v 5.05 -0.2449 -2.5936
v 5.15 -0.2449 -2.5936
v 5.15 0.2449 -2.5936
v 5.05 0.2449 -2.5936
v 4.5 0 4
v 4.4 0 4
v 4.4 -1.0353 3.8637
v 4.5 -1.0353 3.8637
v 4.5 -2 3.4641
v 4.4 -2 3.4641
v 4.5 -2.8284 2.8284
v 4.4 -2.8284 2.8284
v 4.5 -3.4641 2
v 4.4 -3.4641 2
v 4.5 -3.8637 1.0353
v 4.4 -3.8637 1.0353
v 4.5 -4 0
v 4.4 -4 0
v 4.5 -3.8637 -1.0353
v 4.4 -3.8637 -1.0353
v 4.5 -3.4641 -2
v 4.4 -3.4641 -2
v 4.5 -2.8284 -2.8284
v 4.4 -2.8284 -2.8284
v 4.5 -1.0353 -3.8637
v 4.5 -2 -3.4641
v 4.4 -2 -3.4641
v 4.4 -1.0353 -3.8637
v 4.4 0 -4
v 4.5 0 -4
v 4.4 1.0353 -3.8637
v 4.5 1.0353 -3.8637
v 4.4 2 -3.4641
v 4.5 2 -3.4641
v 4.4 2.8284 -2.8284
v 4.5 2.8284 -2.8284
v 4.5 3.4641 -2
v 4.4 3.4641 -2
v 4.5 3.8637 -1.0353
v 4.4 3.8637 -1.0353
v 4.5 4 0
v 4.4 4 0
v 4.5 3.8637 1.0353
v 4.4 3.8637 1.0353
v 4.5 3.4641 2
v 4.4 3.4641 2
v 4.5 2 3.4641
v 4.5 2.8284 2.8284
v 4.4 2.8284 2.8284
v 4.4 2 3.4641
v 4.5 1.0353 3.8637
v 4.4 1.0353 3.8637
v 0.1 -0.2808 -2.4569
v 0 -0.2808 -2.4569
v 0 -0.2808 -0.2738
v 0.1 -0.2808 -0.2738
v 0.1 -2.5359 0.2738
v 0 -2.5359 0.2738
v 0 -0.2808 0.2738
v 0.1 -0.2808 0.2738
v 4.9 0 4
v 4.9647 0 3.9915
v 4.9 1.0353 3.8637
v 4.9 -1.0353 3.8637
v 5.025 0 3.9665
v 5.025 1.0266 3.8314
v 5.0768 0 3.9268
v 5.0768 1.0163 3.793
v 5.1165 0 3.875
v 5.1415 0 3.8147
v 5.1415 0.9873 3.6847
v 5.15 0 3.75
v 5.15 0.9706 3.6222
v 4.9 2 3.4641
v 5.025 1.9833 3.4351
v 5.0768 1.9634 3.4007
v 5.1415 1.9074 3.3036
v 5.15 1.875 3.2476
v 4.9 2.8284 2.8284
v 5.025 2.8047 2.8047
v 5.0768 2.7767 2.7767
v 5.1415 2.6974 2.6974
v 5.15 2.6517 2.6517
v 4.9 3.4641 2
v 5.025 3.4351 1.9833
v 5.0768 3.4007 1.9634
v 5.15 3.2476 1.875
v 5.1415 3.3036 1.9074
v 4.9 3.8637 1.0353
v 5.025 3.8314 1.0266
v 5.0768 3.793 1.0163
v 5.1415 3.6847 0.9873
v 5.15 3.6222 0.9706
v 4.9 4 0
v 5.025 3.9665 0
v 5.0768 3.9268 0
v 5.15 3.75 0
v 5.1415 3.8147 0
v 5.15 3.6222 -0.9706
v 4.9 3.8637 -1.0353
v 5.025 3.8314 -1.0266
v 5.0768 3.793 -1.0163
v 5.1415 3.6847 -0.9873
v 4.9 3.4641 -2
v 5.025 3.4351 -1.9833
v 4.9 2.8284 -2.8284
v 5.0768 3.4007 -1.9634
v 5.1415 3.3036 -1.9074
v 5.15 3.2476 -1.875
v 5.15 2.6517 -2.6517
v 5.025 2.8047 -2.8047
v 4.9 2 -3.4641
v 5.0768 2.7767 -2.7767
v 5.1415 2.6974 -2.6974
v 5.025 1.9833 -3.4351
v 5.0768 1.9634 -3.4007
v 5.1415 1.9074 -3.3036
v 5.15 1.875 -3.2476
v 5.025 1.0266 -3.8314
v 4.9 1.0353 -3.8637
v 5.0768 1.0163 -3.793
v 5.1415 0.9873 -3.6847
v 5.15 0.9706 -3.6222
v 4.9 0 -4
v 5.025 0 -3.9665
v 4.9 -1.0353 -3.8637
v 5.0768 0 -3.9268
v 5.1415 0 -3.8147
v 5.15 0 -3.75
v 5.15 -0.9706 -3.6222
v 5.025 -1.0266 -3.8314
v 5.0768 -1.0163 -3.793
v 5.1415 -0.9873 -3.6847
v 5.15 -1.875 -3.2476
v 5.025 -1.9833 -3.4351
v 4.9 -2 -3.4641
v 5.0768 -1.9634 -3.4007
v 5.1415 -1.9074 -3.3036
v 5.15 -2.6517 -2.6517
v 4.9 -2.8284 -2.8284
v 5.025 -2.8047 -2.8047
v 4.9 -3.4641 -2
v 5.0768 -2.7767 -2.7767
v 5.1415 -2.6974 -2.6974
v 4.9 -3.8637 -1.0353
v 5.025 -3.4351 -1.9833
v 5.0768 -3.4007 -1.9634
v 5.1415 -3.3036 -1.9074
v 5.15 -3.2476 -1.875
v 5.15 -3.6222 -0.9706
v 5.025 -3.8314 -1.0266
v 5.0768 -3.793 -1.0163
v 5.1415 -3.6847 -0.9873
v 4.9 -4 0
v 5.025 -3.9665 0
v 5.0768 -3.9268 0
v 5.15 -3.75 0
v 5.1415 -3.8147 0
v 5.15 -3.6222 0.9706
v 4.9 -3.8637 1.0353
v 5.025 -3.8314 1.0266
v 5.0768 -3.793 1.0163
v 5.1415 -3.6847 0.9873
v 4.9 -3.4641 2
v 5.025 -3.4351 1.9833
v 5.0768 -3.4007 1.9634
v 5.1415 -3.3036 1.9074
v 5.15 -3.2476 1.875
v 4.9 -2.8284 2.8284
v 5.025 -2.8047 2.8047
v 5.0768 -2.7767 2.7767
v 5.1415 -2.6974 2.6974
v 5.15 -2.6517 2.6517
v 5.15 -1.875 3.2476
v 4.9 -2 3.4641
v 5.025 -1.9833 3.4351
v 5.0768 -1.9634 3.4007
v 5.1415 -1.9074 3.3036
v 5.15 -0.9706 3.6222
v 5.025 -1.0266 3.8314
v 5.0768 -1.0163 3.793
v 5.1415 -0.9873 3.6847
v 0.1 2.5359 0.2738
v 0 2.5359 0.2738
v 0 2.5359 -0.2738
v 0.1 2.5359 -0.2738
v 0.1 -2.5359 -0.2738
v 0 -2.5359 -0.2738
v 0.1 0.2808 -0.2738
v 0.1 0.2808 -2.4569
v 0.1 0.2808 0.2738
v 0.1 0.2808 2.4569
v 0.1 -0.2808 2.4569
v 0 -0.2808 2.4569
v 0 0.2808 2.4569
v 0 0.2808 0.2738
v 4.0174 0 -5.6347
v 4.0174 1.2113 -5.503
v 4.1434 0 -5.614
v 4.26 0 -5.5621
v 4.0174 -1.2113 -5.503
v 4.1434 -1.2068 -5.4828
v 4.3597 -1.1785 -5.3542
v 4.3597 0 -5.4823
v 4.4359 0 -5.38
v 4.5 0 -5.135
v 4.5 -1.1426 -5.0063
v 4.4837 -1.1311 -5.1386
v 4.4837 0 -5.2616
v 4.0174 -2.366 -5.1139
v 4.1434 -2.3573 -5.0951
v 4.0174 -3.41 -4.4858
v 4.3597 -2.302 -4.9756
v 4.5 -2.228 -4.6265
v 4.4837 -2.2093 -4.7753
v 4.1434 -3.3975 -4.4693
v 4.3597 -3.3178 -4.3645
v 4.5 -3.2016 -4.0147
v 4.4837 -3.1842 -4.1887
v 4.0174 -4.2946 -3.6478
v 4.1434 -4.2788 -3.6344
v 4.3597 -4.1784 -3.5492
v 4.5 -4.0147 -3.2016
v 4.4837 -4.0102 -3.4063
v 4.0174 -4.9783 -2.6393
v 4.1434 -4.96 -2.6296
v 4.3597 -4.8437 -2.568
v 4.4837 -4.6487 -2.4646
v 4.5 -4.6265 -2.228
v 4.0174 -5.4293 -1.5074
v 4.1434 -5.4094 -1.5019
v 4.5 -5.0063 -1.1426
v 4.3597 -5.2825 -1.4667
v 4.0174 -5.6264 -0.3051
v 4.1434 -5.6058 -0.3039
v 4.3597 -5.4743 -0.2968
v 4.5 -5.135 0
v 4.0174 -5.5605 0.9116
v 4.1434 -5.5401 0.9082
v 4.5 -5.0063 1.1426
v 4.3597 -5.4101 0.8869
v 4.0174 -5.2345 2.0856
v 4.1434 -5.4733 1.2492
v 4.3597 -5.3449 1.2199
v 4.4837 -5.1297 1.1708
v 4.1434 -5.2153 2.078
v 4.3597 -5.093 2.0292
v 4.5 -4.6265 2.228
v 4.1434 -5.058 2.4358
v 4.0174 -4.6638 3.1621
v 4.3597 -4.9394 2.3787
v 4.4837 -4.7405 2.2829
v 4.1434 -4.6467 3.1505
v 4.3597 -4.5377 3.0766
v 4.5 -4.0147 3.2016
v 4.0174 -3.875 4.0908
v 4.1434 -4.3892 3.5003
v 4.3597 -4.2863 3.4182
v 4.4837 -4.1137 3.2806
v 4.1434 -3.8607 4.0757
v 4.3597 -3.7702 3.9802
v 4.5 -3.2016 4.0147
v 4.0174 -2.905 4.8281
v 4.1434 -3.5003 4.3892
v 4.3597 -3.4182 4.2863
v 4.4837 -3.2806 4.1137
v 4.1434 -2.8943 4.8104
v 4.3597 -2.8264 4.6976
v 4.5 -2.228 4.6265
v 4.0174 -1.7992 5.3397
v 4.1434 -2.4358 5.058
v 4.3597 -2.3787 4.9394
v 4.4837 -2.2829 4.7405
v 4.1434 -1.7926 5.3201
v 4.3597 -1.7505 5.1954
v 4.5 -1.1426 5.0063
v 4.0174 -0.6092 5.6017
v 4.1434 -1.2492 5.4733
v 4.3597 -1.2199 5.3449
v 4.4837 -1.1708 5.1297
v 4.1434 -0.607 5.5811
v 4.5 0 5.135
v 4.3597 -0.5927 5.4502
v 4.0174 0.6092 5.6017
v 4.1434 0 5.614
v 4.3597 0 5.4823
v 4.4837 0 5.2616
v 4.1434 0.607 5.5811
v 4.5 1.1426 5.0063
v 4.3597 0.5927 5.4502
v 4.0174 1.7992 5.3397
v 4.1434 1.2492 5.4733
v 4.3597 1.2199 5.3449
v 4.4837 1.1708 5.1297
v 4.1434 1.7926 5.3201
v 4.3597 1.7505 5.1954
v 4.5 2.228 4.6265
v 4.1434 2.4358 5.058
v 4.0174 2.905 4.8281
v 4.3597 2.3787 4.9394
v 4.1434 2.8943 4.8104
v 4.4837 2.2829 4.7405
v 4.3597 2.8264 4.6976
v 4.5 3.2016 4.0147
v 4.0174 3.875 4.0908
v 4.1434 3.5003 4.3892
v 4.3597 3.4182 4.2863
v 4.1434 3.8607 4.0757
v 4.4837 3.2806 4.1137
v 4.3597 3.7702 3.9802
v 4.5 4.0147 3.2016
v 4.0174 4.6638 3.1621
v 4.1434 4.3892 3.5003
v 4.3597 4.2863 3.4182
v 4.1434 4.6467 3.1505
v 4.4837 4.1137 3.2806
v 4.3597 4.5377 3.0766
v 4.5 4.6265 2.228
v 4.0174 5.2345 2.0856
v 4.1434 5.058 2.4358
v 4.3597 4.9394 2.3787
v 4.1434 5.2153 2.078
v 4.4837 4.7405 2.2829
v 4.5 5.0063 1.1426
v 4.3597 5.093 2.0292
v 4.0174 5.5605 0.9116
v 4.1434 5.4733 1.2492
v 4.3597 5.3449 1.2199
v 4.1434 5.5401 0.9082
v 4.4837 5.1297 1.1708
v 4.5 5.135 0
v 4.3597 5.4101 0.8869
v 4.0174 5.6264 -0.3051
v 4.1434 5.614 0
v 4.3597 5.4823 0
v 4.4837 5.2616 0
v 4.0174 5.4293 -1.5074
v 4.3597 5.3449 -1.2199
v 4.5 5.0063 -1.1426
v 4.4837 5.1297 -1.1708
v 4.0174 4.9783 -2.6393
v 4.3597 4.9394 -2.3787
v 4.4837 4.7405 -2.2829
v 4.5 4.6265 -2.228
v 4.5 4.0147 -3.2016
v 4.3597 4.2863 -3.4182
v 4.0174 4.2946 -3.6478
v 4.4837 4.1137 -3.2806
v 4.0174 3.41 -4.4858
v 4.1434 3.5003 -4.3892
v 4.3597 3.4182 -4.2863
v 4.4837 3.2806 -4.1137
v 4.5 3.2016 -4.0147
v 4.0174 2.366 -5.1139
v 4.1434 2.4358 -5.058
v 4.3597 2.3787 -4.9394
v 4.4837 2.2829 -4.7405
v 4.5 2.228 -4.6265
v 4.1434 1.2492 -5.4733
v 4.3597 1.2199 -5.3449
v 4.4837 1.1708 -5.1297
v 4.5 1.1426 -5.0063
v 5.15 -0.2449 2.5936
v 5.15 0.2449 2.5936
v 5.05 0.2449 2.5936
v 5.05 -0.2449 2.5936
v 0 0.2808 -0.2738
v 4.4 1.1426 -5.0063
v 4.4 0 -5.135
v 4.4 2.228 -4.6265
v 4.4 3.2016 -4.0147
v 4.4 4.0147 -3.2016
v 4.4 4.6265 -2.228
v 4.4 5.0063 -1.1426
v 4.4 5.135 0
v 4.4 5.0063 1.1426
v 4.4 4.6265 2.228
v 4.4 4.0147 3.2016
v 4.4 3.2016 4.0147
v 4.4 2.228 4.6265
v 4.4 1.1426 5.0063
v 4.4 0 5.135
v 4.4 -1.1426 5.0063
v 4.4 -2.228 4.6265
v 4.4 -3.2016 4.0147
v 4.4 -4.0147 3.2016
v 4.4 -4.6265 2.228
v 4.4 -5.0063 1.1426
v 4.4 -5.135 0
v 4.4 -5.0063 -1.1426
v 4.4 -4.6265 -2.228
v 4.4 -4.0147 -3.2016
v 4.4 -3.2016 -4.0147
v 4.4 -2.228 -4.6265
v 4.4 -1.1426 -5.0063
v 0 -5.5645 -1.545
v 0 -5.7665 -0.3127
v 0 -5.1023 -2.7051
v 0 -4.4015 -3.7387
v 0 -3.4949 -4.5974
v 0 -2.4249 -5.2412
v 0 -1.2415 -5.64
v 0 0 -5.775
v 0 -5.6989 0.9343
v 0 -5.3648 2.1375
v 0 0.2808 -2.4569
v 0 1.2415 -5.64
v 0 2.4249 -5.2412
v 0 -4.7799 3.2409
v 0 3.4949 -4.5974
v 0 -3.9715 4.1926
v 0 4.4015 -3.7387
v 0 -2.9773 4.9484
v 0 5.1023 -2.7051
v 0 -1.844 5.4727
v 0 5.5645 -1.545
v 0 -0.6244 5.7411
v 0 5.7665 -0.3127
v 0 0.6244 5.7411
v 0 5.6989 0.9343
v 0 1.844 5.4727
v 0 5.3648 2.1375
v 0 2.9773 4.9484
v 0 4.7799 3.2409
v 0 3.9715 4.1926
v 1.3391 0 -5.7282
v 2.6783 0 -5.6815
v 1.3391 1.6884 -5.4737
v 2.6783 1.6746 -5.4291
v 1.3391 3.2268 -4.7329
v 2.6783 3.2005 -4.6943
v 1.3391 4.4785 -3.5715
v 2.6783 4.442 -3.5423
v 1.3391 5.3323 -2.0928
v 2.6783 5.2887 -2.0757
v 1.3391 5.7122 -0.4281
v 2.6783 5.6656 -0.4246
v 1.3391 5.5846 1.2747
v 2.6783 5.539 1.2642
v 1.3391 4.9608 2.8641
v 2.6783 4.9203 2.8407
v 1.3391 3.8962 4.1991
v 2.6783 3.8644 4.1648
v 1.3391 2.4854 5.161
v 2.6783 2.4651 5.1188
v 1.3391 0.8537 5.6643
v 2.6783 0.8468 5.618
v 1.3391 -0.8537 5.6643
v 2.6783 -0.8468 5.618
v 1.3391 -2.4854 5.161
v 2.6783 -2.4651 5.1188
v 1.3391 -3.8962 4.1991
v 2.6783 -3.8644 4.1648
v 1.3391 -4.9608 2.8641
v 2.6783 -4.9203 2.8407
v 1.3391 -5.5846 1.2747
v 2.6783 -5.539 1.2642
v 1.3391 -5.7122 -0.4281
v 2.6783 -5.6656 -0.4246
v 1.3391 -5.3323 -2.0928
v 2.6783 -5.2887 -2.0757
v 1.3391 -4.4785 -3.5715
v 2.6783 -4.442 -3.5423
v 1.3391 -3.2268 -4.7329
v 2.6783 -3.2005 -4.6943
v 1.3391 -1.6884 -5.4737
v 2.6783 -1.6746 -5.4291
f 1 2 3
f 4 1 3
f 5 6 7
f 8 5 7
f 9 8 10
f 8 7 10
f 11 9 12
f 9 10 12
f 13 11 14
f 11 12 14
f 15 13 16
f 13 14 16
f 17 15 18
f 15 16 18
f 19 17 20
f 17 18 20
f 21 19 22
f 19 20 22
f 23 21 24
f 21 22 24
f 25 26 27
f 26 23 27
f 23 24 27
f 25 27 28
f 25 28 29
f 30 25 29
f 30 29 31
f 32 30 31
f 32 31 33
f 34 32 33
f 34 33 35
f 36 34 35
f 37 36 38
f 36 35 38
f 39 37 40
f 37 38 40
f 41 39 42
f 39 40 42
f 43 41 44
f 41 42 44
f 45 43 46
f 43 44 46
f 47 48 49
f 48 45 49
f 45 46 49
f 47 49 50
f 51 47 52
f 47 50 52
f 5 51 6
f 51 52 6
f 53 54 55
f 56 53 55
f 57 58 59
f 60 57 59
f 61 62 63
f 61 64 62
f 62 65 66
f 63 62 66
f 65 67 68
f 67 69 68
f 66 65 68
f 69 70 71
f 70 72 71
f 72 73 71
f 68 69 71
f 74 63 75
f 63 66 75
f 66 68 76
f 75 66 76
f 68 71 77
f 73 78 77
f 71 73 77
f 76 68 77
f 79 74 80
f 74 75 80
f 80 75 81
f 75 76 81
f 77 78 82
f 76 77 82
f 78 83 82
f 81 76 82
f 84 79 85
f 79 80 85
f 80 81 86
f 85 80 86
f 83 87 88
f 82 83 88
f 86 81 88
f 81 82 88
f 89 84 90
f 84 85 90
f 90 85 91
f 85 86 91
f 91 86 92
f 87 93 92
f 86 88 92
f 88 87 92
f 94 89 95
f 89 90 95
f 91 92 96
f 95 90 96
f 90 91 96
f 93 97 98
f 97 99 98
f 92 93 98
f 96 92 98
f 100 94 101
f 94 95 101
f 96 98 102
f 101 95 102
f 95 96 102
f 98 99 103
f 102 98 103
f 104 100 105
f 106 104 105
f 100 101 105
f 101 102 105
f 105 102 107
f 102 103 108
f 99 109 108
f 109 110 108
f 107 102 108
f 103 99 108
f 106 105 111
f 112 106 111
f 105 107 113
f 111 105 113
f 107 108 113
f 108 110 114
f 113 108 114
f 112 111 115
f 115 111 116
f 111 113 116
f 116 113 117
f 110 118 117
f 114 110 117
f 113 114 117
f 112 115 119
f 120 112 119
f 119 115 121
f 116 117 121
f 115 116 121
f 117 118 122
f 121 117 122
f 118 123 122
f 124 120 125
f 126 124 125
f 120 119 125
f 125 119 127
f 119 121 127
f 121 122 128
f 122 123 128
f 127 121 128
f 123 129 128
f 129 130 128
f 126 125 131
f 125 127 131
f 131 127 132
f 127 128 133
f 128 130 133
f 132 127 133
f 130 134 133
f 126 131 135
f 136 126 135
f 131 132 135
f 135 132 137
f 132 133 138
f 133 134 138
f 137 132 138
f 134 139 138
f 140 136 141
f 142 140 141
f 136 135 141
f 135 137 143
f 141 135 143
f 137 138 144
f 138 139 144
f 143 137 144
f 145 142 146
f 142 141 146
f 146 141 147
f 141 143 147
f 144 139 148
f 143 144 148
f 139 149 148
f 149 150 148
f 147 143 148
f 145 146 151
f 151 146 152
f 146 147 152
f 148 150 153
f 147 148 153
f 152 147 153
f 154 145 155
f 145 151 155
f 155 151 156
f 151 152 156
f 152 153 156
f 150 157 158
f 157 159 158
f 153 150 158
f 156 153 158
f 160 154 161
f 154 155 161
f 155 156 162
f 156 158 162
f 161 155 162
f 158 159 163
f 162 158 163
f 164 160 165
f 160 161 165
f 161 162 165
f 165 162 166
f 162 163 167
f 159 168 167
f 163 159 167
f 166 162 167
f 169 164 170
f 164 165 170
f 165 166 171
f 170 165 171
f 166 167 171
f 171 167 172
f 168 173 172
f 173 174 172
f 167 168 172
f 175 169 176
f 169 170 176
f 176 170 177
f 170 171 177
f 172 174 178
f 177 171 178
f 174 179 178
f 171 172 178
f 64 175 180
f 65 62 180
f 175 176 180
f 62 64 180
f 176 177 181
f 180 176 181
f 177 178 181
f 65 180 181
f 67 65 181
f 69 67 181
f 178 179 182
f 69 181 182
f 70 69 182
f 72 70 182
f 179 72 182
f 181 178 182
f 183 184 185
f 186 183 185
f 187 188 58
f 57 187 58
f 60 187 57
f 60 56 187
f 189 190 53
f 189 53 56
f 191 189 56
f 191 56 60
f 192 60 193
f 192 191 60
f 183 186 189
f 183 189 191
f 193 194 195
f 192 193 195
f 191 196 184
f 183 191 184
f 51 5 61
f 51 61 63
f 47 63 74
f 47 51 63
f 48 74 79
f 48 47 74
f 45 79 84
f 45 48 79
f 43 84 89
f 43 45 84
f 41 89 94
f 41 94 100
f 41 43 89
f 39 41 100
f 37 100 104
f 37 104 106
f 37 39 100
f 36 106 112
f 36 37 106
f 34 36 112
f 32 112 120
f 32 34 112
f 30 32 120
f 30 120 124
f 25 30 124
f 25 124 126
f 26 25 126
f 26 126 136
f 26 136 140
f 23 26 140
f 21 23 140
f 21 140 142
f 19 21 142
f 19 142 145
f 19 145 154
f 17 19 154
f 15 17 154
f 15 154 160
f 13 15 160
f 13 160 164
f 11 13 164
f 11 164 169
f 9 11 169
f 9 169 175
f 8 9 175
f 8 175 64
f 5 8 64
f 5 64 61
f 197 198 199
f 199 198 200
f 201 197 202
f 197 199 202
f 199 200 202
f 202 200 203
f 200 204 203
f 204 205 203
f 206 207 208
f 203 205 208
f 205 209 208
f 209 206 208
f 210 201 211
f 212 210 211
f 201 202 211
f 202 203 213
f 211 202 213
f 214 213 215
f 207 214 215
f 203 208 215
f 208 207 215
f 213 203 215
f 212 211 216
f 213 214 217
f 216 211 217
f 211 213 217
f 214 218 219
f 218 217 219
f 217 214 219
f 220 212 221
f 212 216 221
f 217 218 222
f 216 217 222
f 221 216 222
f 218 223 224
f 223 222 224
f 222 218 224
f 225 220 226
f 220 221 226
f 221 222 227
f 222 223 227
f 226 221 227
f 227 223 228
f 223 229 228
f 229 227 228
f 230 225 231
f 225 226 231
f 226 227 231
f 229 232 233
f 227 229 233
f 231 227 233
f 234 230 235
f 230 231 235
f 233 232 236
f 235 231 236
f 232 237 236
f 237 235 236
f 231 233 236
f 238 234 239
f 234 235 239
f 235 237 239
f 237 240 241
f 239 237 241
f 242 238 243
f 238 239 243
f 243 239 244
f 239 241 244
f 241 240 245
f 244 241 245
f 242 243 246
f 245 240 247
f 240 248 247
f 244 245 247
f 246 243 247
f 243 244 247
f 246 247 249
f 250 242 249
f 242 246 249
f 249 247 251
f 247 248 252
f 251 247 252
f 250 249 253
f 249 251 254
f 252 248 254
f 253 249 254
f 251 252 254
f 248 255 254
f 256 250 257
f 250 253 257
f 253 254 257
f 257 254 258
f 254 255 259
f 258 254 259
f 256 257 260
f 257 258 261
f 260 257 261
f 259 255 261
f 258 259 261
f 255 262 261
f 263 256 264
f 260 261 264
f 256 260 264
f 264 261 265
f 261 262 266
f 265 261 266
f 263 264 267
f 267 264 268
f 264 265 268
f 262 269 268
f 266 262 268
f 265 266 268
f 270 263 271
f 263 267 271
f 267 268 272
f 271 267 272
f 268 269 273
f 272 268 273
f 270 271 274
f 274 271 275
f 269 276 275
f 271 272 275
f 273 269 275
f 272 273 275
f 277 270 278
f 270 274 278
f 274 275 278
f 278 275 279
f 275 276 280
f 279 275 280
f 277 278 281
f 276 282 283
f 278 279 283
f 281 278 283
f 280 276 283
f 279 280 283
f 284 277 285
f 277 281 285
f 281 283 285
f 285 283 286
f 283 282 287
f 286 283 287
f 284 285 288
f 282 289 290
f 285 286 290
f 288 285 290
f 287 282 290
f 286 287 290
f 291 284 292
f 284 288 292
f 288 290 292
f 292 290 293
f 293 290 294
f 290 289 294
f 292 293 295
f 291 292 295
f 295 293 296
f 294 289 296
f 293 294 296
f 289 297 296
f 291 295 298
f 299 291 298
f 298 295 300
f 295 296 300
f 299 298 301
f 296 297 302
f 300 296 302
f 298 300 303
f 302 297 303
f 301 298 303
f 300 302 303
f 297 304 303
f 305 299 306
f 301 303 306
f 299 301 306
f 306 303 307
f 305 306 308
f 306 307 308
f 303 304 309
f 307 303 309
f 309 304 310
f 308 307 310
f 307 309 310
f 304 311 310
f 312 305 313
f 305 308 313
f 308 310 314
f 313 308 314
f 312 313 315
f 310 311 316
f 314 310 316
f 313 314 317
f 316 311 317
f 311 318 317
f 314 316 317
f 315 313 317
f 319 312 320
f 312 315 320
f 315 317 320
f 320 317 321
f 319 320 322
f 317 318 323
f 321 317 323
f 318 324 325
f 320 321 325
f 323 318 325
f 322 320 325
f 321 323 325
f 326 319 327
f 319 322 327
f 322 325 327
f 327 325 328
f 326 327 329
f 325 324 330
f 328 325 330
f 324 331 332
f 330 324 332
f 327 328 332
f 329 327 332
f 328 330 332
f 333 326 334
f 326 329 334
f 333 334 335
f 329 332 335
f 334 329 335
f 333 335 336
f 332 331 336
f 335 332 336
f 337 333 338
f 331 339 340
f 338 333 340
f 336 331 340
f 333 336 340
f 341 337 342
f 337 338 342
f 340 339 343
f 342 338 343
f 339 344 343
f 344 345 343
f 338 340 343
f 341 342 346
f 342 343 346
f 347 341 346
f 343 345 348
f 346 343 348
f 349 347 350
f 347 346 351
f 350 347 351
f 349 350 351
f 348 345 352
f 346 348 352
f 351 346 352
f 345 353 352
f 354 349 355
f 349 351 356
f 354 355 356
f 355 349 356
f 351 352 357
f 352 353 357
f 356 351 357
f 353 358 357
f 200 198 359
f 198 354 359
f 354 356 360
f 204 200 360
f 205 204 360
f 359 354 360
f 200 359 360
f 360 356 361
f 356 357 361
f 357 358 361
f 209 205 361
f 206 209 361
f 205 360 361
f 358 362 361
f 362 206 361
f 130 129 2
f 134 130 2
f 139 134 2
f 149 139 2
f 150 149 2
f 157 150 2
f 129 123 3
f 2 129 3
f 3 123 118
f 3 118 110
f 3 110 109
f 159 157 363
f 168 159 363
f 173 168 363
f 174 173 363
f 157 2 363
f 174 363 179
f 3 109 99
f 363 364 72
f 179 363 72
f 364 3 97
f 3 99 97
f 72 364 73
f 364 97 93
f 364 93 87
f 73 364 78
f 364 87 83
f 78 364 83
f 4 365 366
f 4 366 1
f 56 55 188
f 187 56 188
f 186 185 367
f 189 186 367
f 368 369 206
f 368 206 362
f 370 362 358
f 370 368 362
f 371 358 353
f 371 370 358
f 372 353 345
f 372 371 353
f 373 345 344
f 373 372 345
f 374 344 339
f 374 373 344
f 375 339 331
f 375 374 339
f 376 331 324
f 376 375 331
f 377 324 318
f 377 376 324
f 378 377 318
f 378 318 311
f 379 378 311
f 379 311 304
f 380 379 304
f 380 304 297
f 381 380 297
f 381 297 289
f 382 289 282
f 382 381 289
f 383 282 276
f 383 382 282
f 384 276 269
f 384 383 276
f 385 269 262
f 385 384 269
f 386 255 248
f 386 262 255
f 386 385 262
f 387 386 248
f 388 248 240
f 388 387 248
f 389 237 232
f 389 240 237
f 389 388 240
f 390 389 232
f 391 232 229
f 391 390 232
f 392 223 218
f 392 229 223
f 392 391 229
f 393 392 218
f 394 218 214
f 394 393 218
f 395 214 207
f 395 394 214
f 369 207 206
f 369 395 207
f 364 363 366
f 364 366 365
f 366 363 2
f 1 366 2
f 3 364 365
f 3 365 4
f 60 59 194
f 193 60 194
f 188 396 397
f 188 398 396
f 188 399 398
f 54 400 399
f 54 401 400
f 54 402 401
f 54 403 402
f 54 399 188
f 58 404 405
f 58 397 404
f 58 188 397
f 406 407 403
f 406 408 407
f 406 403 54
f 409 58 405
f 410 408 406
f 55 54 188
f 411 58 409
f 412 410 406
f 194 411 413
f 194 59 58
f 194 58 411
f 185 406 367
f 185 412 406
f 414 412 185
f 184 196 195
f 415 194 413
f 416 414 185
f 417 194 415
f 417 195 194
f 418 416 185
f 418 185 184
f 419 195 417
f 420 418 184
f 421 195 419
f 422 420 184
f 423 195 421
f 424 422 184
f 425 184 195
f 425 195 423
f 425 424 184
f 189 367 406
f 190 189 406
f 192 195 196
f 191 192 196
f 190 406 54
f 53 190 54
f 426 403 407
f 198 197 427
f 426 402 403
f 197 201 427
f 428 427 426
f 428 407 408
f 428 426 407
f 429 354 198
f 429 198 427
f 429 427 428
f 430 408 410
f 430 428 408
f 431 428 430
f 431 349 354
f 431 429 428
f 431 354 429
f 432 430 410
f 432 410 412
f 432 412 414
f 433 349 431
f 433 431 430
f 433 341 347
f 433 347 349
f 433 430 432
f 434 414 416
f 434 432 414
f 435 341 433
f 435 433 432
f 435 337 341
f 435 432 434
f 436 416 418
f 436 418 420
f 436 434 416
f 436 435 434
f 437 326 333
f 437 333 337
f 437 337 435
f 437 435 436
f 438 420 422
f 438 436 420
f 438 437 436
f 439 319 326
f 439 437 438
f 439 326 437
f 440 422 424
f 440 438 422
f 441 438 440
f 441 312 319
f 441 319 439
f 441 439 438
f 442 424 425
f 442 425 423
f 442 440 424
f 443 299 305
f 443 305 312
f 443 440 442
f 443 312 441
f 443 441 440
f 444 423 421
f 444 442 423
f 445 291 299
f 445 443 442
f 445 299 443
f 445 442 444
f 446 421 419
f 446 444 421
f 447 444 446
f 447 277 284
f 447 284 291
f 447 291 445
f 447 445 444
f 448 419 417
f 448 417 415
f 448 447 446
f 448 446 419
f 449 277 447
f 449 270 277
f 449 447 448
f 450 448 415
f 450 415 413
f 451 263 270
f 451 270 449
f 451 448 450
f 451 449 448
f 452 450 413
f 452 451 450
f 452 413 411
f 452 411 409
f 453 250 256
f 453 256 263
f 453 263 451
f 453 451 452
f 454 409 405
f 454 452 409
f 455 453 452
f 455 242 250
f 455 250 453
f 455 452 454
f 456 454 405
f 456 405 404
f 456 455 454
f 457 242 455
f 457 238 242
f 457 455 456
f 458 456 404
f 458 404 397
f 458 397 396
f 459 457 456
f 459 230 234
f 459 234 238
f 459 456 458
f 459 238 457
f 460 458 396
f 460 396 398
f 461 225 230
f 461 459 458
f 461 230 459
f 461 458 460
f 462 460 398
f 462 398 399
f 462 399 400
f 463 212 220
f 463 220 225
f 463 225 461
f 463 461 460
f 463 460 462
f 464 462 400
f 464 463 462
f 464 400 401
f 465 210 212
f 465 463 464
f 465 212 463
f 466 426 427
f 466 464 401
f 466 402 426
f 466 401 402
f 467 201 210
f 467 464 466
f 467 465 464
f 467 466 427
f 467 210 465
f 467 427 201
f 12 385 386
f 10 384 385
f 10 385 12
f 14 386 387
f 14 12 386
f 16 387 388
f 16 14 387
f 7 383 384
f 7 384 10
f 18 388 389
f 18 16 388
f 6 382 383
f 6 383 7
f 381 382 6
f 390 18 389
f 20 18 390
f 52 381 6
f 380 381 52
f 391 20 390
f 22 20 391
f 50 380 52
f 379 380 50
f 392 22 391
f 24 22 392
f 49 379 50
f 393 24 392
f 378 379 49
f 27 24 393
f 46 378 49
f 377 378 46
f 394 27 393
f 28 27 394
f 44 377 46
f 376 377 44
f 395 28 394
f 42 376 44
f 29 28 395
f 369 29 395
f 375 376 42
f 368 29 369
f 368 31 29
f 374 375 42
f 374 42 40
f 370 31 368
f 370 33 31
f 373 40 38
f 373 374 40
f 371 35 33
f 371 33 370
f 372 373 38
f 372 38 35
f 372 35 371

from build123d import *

# Parameters (mm, degrees)
SKETCH1_R           = 5.775
BOSS_EXTRUDE1_DEPTH = 4.5
BOSS_EXTRUDE1_TAPER = 2
SKETCH2_R           = 4
BOSS_EXTRUDE2_DEPTH = 5.15
FILLET1_R           = 0.5
FILLET2_R           = 0.25
CUT_EXTRUDE1_START  = -0.1
SKETCH3_R           = 5.13501215
SKETCH3_R_2         = 4
CUT_EXTRUDE1_DEPTH  = 0.1
CUT_EXTRUDE2_DEPTH  = 0.1
SKETCH5_W           = 5.187150014
SKETCH5_H           = 0.489897502
CUT_EXTRUDE3_DEPTH  = 0.1


with BuildPart() as part:
    # Sketch1 → Boss-Extrude1 (new body)
    with BuildSketch(Plane(origin=(0, 0, 0), x_dir=(0, 0, -1), z_dir=(1, 0, 0))):
        Circle(SKETCH1_R)
    extrude(amount=BOSS_EXTRUDE1_DEPTH, taper=BOSS_EXTRUDE1_TAPER)

    # Sketch2 → Boss-Extrude2 (add)
    with BuildSketch(Plane.ZY):
        Circle(SKETCH2_R)
    extrude(amount=-BOSS_EXTRUDE2_DEPTH)

    # Fillet1
    fillet1_edges = [part.edges().sort_by_distance(p)[0] for p in [
        (4.5, 0, 5.617856537),
    ]]
    fillet(fillet1_edges, radius=FILLET1_R)

    # Fillet2
    fillet2_edges = [part.edges().sort_by_distance(p)[0] for p in [
        (5.15, 0, -4),
    ]]
    fillet(fillet2_edges, radius=FILLET2_R)

    # Sketch3 → Cut-Extrude1 (cut)
    with BuildSketch(Plane(origin=(4.5, 0, 0), x_dir=(0, 0, -1), z_dir=(1, 0, 0)).offset(CUT_EXTRUDE1_START)):
        Circle(SKETCH3_R)
        with Locations(Location((0, 0, 0), (0, 0, 180))):
            Circle(SKETCH3_R_2, mode=Mode.SUBTRACT)
    extrude(amount=CUT_EXTRUDE1_DEPTH, mode=Mode.SUBTRACT)

    # Sketch4 → Cut-Extrude2 (cut)
    with BuildSketch(Plane.ZY):
        Polygon((-0.273766251, -2.535940007), (0.273766251, -2.535940007), (0.273766251, -0.280846858), (2.456875417, -0.280846858), (2.456875417, 0.280846858), (0.273766251, 0.280846858), (0.273766251, 2.535940007), (-0.273766251, 2.535940007), (-0.273766251, 0.280846858), (-2.456875417, 0.280846858), (-2.456875417, -0.280846858), (-0.273766251, -0.280846858), align=None)
    extrude(amount=-CUT_EXTRUDE2_DEPTH, mode=Mode.SUBTRACT)

    # Sketch5 → Cut-Extrude3 (cut)
    with BuildSketch(Plane(origin=(5.15, 0, 0), x_dir=(0, 0, -1), z_dir=(1, 0, 0))):
        Rectangle(SKETCH5_W, SKETCH5_H)
    extrude(amount=-CUT_EXTRUDE3_DEPTH, mode=Mode.SUBTRACT)


solid = part.part
